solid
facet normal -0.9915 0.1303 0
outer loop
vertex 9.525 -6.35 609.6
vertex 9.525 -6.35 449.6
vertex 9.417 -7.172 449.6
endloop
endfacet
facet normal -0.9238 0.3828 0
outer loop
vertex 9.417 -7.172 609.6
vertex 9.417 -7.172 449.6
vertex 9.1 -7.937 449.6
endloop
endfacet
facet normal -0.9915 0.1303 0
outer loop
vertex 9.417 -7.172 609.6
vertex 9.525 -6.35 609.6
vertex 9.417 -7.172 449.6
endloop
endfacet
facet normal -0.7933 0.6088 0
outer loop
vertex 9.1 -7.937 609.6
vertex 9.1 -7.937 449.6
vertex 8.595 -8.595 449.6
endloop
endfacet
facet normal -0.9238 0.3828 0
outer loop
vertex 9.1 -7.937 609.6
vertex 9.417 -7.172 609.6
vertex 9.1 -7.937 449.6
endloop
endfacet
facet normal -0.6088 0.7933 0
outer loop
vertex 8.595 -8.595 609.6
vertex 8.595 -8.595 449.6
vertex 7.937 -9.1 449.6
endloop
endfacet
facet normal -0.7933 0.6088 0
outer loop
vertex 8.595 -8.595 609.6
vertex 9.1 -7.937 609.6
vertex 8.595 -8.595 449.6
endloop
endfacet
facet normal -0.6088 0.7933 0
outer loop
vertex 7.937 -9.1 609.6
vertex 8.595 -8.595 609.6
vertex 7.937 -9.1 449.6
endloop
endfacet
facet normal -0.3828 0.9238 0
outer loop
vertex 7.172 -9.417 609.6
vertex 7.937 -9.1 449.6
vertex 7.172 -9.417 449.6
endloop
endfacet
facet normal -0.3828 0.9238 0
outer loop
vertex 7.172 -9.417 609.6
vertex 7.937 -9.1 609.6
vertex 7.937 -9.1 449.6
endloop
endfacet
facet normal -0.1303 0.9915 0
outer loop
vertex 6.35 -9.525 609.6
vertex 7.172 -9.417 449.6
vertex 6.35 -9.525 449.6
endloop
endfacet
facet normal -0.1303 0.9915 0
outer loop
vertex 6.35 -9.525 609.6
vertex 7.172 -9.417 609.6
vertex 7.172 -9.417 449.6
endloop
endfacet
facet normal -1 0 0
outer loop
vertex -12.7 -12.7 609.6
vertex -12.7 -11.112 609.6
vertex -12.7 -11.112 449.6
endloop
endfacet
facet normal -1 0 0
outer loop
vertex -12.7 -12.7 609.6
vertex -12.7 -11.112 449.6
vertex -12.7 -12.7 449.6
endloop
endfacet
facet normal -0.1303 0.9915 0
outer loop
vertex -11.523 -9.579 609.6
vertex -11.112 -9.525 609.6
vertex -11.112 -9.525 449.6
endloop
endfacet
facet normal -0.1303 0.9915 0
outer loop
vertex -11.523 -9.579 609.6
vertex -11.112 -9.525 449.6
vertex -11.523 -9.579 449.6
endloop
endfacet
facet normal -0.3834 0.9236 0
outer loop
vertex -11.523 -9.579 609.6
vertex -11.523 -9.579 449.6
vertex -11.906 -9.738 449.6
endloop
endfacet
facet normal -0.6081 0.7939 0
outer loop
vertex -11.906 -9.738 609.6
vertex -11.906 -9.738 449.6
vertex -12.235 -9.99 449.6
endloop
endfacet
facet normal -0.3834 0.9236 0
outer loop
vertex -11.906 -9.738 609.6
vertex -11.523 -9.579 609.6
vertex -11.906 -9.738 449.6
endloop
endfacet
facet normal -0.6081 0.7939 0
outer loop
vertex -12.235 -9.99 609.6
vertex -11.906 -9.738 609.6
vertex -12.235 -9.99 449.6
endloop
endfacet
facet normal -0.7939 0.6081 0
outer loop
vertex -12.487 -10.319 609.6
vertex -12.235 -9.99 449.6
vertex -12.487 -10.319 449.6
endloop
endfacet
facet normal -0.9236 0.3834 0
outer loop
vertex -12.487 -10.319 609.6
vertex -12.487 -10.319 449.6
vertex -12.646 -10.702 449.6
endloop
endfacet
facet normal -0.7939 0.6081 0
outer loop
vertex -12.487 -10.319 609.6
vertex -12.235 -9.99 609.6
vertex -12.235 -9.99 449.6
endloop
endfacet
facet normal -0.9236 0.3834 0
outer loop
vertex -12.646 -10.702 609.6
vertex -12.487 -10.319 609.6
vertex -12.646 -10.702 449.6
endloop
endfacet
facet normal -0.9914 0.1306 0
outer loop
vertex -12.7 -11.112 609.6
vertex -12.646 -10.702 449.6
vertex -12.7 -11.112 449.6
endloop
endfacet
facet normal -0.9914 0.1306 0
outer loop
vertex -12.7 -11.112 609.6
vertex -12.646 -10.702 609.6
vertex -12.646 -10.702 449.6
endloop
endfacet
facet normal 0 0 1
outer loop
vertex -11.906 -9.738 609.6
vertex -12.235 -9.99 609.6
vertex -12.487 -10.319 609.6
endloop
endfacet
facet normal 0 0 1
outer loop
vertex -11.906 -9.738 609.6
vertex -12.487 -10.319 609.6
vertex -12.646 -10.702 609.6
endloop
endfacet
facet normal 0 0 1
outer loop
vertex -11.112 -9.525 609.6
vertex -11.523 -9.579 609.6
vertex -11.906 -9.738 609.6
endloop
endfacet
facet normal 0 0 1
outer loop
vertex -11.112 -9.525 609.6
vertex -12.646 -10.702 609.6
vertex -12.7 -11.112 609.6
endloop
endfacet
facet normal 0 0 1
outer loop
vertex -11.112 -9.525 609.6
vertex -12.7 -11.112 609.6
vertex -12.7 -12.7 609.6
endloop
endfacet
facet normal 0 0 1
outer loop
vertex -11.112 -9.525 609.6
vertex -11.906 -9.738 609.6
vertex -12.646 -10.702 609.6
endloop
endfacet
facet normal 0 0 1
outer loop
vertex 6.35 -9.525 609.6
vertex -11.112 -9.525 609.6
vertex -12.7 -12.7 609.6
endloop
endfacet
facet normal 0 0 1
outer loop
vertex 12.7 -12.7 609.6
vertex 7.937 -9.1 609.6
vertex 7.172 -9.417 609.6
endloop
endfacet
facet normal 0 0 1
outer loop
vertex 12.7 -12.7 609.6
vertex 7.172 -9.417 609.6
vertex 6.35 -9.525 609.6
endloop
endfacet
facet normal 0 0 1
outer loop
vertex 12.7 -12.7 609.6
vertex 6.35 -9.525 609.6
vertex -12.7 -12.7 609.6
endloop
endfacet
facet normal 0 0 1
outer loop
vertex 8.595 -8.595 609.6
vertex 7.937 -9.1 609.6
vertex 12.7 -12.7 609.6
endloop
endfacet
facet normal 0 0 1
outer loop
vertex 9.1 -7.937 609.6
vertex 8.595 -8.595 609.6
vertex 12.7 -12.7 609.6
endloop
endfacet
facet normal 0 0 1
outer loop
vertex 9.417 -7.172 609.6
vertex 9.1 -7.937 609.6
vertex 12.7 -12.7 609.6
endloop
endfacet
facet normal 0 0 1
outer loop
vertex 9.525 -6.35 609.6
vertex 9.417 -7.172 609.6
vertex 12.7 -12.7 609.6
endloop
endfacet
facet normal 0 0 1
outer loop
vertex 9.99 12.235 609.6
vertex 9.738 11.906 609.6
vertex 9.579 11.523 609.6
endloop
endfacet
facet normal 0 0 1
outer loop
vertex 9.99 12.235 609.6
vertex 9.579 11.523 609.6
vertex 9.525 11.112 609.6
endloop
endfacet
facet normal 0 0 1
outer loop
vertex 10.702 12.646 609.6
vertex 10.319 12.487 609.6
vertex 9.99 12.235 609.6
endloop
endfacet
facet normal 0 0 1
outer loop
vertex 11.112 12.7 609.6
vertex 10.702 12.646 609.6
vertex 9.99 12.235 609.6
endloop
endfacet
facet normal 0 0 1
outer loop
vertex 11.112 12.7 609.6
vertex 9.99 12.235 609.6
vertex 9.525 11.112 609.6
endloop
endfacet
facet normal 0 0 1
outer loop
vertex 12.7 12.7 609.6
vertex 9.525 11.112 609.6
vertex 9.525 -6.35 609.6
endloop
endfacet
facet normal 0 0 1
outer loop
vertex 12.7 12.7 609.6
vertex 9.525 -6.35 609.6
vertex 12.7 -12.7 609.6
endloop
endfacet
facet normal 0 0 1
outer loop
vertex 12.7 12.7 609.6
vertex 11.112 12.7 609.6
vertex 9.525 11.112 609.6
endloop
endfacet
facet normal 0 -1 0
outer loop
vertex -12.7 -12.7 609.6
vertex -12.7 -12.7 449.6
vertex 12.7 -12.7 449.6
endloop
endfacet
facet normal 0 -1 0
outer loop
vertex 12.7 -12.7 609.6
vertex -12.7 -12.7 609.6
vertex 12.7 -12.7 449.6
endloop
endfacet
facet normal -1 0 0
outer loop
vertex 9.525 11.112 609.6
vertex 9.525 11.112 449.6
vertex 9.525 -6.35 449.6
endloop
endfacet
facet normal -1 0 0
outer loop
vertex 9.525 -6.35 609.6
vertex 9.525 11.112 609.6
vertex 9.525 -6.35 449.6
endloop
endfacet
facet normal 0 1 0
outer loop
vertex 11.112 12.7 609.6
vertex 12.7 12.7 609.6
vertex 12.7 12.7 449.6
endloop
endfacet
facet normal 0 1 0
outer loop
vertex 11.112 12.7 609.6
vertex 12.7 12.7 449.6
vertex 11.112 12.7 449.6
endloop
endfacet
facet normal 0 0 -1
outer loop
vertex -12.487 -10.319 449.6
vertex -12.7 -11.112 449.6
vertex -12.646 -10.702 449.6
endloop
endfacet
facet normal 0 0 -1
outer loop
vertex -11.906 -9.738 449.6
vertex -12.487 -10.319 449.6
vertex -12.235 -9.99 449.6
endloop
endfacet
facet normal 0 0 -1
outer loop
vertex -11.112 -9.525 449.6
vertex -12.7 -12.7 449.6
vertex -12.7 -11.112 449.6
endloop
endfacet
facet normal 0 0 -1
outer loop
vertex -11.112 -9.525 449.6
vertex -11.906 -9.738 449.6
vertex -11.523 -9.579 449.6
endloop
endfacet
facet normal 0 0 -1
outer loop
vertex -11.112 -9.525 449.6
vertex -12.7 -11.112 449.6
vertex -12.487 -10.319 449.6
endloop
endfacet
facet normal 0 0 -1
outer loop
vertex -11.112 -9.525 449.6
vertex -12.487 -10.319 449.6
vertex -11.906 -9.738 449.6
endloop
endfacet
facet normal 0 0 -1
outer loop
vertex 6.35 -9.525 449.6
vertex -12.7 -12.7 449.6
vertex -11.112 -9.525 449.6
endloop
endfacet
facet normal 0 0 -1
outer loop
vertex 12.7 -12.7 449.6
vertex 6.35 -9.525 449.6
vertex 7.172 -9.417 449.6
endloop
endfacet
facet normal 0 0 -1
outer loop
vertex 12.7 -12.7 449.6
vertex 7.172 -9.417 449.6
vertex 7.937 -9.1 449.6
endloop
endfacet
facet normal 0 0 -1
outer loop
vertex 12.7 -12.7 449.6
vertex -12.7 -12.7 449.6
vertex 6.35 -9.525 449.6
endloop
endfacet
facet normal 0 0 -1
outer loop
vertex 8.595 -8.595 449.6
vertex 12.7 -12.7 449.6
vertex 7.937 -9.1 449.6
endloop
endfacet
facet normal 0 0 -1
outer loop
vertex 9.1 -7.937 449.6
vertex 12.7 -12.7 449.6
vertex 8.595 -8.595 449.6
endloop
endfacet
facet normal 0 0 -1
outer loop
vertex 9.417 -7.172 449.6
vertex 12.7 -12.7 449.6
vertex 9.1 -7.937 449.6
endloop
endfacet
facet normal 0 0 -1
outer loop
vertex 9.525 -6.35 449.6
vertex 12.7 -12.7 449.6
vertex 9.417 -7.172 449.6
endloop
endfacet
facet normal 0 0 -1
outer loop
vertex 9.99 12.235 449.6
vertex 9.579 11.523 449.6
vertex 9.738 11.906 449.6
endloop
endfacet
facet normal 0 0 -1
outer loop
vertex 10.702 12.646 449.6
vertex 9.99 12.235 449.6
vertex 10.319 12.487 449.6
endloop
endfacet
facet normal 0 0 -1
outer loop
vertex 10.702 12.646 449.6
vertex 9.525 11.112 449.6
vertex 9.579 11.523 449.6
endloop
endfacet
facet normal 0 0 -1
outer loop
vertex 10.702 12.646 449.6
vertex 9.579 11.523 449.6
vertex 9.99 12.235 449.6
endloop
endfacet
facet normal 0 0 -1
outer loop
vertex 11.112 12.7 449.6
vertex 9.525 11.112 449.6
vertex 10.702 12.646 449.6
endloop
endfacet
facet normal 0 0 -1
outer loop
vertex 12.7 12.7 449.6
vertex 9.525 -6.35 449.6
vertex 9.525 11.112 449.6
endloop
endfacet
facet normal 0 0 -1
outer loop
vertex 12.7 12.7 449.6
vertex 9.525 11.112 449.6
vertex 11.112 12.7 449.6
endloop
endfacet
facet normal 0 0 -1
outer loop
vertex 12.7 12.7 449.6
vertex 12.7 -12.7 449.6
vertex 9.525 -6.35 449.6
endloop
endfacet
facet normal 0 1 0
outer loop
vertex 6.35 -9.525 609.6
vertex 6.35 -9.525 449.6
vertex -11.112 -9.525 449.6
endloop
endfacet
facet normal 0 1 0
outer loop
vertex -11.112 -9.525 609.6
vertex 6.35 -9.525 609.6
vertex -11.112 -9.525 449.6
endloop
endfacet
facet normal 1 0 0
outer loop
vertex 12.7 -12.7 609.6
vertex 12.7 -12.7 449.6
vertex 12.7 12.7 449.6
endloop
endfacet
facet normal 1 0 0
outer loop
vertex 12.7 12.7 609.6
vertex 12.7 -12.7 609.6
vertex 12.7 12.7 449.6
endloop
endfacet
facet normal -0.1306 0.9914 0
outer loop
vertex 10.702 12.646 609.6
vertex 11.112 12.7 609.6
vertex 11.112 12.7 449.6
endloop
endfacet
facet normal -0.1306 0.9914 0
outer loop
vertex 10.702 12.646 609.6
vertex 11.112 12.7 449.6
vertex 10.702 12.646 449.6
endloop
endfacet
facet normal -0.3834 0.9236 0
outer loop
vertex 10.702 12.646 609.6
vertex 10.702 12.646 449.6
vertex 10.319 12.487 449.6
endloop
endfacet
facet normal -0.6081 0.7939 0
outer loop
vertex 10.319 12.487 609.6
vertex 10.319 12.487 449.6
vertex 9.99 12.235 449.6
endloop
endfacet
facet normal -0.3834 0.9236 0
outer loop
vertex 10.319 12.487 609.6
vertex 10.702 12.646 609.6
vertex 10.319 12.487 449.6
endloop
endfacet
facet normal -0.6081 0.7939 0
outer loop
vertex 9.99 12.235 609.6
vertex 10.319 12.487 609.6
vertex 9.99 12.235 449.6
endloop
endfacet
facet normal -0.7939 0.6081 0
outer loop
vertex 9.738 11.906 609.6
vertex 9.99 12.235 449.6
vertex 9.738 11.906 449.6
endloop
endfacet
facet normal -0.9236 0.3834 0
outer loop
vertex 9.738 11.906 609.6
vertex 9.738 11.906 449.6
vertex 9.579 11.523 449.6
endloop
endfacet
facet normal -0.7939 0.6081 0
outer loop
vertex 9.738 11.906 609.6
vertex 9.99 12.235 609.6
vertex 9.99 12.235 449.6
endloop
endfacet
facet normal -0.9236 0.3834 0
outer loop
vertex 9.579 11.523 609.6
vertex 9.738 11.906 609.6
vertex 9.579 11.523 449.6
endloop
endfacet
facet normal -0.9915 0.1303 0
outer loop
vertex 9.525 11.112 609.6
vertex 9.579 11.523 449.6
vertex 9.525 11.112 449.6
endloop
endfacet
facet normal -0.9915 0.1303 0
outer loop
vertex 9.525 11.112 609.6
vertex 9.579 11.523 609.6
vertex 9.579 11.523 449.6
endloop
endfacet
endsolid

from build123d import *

# Parameters (mm, degrees)
BOSS_EXTRUDE1_DEPTH = 609.6
SKETCH3_W           = 1059.2
SKETCH3_H           = 25.4
CUT_EXTRUDE2_DEPTH  = 30.48


with BuildPart() as part:
    # Sketch2 → Boss-Extrude1 (new, symmetric)
    with BuildSketch(Plane.XY):
        with BuildLine():
            Line((-12.7, -12.7), (12.7, -12.7))
            Line((12.7, -12.7), (12.7, 12.7))
            Line((12.7, 12.7), (11.1125, 12.7))
            ThreePointArc((11.1125, 12.7), (9.989967985, 12.235032015), (9.525, 11.1125))
            Line((9.525, 11.1125), (9.525, -6.35))
            ThreePointArc((9.525, -6.35), (8.59506403, -8.59506403), (6.35, -9.525))
            Line((6.35, -9.525), (-11.1125, -9.525))
            ThreePointArc((-11.1125, -9.525), (-12.235032015, -9.989967985), (-12.7, -11.1125))
            Line((-12.7, -11.1125), (-12.7, -12.7))
        make_face()
    extrude(amount=BOSS_EXTRUDE1_DEPTH, both=True)

    # Sketch3 → Cut-Extrude2 (cut)
    with BuildSketch(Plane(origin=(12.7, 0, 0), x_dir=(0, 0, -1), z_dir=(1, 0, 0))):
        with Locations((80, 0)):
            Rectangle(SKETCH3_W, SKETCH3_H)
    extrude(amount=-CUT_EXTRUDE2_DEPTH, mode=Mode.SUBTRACT)


solid = part.part
